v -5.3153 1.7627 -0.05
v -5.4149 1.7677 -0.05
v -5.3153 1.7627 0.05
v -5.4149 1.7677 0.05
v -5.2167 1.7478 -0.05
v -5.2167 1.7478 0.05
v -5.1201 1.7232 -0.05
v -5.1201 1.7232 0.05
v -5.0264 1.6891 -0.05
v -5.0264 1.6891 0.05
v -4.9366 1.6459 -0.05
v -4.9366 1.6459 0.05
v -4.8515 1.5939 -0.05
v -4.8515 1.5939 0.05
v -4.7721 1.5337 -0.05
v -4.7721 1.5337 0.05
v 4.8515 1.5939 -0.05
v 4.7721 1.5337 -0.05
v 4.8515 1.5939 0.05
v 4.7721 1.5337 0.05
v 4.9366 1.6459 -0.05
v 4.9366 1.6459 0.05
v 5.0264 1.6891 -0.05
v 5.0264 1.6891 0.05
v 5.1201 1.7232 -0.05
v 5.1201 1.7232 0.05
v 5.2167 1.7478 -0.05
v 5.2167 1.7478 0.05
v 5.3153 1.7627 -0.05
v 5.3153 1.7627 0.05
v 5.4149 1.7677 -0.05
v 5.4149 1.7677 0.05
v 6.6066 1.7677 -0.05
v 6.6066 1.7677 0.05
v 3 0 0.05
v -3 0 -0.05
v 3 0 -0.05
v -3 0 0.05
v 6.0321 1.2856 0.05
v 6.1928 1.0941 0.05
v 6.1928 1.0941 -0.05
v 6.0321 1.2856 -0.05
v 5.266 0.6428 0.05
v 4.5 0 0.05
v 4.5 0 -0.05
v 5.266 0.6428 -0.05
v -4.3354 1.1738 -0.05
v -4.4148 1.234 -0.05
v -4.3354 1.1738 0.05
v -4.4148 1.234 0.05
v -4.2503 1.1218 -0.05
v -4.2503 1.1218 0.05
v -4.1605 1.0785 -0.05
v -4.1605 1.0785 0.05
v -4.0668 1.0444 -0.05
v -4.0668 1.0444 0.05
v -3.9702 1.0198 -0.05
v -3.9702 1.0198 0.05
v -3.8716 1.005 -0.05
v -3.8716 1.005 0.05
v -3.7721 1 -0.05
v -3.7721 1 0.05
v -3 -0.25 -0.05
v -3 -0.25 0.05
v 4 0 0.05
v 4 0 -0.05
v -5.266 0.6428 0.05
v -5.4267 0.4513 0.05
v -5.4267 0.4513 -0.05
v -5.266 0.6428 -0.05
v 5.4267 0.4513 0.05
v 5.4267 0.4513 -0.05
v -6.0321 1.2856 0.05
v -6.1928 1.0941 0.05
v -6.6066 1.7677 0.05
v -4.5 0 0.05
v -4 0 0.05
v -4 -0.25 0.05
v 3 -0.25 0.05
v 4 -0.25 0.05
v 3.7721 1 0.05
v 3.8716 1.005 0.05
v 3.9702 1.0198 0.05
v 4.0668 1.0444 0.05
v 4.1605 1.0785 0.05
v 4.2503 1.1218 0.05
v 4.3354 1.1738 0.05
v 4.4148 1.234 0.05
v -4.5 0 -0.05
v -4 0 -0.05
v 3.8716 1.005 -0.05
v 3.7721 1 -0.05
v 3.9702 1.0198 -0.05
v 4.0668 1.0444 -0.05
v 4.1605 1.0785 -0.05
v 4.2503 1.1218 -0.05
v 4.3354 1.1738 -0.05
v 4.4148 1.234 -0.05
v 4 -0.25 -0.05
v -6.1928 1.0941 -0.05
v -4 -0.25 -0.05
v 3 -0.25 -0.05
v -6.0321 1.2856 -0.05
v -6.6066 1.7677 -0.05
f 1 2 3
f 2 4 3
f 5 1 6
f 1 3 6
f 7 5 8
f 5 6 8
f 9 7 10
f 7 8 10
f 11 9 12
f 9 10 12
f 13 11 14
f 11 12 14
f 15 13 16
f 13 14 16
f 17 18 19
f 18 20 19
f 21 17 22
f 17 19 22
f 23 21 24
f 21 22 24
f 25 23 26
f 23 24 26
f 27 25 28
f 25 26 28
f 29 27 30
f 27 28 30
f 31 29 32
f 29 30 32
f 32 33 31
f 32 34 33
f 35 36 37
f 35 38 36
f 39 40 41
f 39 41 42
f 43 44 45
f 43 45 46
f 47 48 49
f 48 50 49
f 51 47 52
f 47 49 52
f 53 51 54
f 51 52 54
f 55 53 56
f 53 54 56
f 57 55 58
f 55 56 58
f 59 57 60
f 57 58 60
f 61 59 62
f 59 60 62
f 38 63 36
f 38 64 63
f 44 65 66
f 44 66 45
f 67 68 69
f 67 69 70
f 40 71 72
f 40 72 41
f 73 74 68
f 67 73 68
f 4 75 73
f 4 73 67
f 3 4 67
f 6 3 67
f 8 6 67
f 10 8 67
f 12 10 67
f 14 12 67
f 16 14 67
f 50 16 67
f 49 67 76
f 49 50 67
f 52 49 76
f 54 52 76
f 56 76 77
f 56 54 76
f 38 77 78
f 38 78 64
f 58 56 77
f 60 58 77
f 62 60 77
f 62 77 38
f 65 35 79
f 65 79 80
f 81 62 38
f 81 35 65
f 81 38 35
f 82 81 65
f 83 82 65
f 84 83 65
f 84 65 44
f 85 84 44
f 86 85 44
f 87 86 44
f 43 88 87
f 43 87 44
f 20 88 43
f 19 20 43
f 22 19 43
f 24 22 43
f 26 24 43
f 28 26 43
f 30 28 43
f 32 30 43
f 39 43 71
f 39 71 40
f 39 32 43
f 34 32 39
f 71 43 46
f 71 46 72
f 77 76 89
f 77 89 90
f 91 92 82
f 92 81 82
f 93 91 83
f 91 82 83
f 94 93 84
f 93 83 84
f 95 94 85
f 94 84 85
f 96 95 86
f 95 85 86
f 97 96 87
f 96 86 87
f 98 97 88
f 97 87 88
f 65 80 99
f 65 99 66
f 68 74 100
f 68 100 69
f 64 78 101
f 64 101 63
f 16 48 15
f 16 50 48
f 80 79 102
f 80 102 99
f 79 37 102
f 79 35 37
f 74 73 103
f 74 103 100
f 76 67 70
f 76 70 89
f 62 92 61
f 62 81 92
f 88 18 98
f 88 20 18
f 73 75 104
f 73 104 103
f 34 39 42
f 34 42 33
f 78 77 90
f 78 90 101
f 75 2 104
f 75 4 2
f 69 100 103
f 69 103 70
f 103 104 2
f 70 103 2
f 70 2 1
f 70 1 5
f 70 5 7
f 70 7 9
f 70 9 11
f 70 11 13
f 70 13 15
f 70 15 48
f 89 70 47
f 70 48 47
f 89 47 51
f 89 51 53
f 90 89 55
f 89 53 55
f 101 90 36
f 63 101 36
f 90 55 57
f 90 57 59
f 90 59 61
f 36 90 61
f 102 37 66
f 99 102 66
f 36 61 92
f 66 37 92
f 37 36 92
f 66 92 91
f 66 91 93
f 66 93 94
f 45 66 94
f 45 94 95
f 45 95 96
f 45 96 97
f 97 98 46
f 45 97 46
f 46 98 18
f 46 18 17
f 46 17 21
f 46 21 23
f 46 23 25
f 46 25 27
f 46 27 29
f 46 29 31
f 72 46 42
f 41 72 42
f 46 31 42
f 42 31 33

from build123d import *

# Parameters (mm, degrees)
BOSS_EXTRUDE1_DEPTH = 0.05
FILLET1_R           = 1


with BuildPart() as part:
    # frame_outline → Boss-Extrude1 (new, symmetric)
    with BuildSketch(Plane.XY):
        Polygon((0, 0), (3, 0), (3, -0.25), (4, -0.25), (4, 0), (4.5, 0), (5.266044443, 0.64278761), (5.426741346, 0.451276499), (6.192785789, 1.094064109), (6.032088886, 1.285575219), (6.606622219, 1.767665927), (5.050898392, 1.767665927), (4.136029766, 1), (-4.136029766, 1), (-5.050898392, 1.767665927), (-6.606622219, 1.767665927), (-6.032088886, 1.285575219), (-6.192785789, 1.094064109), (-5.426741346, 0.451276499), (-5.266044443, 0.64278761), (-4.5, 0), (-4, 0), (-4, -0.25), (-3, -0.25), (-3, 0), align=None)
    extrude(amount=BOSS_EXTRUDE1_DEPTH, both=True)

    # Fillet1
    fillet1_edges = [part.edges().sort_by_distance(p)[0] for p in [
        (-5.050898392, 1.767665927, 0),
        (-4.136029766, 1, 0),
        (4.136029766, 1, 0),
        (5.050898392, 1.767665927, 0),
    ]]
    fillet(fillet1_edges, radius=FILLET1_R)


solid = part.part
